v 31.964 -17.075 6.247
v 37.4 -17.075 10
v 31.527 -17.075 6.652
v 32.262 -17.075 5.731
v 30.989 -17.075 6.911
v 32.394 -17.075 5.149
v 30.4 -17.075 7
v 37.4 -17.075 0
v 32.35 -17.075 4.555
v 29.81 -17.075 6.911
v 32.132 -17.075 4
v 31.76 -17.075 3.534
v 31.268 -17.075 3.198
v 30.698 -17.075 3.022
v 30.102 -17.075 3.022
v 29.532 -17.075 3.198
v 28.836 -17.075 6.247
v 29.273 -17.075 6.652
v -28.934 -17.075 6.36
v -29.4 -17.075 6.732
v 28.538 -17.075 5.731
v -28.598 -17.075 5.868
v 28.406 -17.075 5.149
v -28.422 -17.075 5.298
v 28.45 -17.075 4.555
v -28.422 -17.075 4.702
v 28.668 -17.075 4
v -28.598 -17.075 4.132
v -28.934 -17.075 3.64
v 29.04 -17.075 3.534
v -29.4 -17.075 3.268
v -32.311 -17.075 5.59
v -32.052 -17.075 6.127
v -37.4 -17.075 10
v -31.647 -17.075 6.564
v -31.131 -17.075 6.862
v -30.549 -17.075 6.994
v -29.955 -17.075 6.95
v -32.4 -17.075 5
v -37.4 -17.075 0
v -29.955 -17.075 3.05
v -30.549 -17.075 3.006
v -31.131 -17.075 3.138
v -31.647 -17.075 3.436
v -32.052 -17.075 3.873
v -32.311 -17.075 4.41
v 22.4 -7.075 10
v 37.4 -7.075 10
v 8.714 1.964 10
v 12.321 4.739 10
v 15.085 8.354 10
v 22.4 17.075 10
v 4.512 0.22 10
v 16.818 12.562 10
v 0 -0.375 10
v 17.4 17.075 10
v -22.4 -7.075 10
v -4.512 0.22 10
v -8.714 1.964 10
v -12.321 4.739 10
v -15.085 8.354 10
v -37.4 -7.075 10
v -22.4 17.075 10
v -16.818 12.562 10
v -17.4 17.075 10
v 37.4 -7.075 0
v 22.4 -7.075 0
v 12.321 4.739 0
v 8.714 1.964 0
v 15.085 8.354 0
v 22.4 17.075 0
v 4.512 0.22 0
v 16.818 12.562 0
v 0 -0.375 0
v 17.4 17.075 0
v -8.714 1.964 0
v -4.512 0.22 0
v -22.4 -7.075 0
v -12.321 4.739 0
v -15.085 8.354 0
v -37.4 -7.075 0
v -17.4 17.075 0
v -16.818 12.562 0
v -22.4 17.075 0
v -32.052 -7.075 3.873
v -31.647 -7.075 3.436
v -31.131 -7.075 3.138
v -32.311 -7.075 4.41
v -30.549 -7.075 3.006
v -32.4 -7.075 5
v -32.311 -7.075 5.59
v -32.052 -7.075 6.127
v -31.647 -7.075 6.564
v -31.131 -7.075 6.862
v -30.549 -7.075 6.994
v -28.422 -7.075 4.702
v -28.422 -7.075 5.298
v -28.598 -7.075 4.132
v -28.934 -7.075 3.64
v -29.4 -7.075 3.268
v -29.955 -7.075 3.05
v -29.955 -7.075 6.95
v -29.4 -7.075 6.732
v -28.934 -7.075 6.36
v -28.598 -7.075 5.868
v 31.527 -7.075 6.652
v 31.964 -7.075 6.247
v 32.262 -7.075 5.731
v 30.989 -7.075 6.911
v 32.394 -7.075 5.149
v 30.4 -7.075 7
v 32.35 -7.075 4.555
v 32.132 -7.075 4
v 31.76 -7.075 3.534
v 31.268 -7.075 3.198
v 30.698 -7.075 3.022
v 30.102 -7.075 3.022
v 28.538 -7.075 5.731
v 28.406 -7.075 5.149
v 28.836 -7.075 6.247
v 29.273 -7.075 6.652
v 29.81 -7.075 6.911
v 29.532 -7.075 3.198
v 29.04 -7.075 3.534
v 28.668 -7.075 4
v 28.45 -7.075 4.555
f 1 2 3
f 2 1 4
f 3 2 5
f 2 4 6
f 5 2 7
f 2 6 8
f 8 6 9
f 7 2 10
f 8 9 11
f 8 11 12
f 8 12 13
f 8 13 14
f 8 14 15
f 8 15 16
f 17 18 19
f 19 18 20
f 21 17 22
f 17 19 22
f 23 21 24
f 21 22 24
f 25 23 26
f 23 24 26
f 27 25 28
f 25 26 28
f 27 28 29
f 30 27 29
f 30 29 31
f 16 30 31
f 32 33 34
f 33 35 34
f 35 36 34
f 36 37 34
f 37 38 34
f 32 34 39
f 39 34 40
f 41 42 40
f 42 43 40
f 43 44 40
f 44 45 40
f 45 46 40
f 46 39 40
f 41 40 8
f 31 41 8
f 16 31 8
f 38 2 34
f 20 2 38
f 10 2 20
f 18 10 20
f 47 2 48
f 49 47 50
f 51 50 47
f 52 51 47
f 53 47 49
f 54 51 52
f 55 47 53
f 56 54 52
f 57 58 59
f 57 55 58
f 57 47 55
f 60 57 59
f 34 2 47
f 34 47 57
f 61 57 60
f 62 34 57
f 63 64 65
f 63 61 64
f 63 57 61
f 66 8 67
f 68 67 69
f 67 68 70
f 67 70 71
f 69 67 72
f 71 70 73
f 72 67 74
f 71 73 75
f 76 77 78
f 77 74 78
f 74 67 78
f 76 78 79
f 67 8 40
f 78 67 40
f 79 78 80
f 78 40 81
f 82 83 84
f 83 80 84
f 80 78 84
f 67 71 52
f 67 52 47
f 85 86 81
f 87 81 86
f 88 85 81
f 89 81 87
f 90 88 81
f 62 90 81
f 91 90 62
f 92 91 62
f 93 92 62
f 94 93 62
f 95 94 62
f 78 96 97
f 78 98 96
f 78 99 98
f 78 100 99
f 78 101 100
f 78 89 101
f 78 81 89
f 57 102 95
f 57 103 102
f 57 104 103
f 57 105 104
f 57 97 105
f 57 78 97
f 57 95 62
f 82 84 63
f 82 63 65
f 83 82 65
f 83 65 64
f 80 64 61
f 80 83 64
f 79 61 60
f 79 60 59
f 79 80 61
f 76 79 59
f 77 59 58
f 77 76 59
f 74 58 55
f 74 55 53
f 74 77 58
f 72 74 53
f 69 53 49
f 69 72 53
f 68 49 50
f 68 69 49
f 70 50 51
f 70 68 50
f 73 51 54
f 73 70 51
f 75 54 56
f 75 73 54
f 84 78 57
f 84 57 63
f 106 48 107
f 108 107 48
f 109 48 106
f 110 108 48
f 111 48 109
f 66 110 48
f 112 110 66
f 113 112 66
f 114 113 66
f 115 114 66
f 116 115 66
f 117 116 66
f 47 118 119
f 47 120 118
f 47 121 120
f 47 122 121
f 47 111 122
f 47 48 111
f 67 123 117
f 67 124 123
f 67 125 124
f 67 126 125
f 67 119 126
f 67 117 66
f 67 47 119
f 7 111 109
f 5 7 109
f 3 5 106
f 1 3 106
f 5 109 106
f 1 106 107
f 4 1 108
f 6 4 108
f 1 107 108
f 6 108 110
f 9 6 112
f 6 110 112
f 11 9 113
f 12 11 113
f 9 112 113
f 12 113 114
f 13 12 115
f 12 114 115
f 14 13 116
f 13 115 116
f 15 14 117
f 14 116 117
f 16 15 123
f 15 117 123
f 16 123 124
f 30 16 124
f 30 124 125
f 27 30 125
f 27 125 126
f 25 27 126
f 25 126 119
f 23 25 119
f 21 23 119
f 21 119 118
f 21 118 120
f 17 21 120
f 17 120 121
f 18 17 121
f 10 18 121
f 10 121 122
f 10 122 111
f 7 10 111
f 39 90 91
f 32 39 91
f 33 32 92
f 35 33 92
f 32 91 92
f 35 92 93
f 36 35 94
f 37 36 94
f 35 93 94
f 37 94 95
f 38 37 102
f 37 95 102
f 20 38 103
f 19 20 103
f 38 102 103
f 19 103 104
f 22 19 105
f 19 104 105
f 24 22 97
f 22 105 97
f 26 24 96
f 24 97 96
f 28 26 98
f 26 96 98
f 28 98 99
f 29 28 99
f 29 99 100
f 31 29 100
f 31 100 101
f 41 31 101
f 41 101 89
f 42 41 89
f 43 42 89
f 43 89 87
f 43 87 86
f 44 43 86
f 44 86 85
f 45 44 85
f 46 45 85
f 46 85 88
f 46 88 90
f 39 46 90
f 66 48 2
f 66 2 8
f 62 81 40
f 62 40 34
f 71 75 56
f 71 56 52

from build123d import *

# Parameters (mm, degrees)
BOSS_EXTRU_1_DEPTH      = 10
ESQUISSE2_W             = 10
ESQUISSE2_H             = 10
BOSS_EXTRU_2_DEPTH      = 15
ESQUISSE3_W             = 10
ESQUISSE3_H             = 10
BOSS_EXTRU_3_DEPTH      = 15
ESQUISSE4_R             = 2
ENL_V_MAT_EXTRU_1_DEPTH = 20


with BuildPart() as part:
    # Esquisse1 → Boss.-Extru.1 (new body)
    with BuildSketch(Plane.XY):
        with BuildLine():
            Line((-22.399928161, 17.075), (-17.399928161, 17.075))
            ThreePointArc((-17.399928161, 17.075), (0, -0.375), (17.399928161, 17.075))
            Line((17.399928161, 17.075), (22.399928161, 17.075))
            Line((22.399928161, 17.075), (22.399928161, -17.075))
            Line((22.399928161, -17.075), (-22.399928161, -17.075))
            Line((-22.399928161, -17.075), (-22.399928161, 17.075))
        make_face()
    extrude(amount=BOSS_EXTRU_1_DEPTH)

    # Esquisse2 → Boss.-Extru.2 (add)
    with BuildSketch(Plane.ZY.offset(22.399928161)):
        with Locations((5, -12.075)):
            Rectangle(ESQUISSE2_W, ESQUISSE2_H)
    extrude(amount=BOSS_EXTRU_2_DEPTH)

    # Esquisse3 → Boss.-Extru.3 (add)
    with BuildSketch(Plane(origin=(22.399928161, 0, 0), x_dir=(0, 0, -1), z_dir=(1, 0, 0))):
        with Locations((-5, -12.075)):
            Rectangle(ESQUISSE3_W, ESQUISSE3_H)
    extrude(amount=BOSS_EXTRU_3_DEPTH)

    # Esquisse4 → Enlèv. mat.-Extru.1 (cut)
    with BuildSketch(Plane(origin=(0, -7.075, 0), x_dir=(1, 0, 0), z_dir=(0, 1, 0))):
        with Locations(Location((-30.399928161, -5, 0), (0, 0, 180))):
            Circle(ESQUISSE4_R)
        with Locations(Location((30.399928161, -5, 0), (0, 0, 270))):
            Circle(ESQUISSE4_R)
    extrude(amount=-ENL_V_MAT_EXTRU_1_DEPTH, mode=Mode.SUBTRACT)


solid = part.part
